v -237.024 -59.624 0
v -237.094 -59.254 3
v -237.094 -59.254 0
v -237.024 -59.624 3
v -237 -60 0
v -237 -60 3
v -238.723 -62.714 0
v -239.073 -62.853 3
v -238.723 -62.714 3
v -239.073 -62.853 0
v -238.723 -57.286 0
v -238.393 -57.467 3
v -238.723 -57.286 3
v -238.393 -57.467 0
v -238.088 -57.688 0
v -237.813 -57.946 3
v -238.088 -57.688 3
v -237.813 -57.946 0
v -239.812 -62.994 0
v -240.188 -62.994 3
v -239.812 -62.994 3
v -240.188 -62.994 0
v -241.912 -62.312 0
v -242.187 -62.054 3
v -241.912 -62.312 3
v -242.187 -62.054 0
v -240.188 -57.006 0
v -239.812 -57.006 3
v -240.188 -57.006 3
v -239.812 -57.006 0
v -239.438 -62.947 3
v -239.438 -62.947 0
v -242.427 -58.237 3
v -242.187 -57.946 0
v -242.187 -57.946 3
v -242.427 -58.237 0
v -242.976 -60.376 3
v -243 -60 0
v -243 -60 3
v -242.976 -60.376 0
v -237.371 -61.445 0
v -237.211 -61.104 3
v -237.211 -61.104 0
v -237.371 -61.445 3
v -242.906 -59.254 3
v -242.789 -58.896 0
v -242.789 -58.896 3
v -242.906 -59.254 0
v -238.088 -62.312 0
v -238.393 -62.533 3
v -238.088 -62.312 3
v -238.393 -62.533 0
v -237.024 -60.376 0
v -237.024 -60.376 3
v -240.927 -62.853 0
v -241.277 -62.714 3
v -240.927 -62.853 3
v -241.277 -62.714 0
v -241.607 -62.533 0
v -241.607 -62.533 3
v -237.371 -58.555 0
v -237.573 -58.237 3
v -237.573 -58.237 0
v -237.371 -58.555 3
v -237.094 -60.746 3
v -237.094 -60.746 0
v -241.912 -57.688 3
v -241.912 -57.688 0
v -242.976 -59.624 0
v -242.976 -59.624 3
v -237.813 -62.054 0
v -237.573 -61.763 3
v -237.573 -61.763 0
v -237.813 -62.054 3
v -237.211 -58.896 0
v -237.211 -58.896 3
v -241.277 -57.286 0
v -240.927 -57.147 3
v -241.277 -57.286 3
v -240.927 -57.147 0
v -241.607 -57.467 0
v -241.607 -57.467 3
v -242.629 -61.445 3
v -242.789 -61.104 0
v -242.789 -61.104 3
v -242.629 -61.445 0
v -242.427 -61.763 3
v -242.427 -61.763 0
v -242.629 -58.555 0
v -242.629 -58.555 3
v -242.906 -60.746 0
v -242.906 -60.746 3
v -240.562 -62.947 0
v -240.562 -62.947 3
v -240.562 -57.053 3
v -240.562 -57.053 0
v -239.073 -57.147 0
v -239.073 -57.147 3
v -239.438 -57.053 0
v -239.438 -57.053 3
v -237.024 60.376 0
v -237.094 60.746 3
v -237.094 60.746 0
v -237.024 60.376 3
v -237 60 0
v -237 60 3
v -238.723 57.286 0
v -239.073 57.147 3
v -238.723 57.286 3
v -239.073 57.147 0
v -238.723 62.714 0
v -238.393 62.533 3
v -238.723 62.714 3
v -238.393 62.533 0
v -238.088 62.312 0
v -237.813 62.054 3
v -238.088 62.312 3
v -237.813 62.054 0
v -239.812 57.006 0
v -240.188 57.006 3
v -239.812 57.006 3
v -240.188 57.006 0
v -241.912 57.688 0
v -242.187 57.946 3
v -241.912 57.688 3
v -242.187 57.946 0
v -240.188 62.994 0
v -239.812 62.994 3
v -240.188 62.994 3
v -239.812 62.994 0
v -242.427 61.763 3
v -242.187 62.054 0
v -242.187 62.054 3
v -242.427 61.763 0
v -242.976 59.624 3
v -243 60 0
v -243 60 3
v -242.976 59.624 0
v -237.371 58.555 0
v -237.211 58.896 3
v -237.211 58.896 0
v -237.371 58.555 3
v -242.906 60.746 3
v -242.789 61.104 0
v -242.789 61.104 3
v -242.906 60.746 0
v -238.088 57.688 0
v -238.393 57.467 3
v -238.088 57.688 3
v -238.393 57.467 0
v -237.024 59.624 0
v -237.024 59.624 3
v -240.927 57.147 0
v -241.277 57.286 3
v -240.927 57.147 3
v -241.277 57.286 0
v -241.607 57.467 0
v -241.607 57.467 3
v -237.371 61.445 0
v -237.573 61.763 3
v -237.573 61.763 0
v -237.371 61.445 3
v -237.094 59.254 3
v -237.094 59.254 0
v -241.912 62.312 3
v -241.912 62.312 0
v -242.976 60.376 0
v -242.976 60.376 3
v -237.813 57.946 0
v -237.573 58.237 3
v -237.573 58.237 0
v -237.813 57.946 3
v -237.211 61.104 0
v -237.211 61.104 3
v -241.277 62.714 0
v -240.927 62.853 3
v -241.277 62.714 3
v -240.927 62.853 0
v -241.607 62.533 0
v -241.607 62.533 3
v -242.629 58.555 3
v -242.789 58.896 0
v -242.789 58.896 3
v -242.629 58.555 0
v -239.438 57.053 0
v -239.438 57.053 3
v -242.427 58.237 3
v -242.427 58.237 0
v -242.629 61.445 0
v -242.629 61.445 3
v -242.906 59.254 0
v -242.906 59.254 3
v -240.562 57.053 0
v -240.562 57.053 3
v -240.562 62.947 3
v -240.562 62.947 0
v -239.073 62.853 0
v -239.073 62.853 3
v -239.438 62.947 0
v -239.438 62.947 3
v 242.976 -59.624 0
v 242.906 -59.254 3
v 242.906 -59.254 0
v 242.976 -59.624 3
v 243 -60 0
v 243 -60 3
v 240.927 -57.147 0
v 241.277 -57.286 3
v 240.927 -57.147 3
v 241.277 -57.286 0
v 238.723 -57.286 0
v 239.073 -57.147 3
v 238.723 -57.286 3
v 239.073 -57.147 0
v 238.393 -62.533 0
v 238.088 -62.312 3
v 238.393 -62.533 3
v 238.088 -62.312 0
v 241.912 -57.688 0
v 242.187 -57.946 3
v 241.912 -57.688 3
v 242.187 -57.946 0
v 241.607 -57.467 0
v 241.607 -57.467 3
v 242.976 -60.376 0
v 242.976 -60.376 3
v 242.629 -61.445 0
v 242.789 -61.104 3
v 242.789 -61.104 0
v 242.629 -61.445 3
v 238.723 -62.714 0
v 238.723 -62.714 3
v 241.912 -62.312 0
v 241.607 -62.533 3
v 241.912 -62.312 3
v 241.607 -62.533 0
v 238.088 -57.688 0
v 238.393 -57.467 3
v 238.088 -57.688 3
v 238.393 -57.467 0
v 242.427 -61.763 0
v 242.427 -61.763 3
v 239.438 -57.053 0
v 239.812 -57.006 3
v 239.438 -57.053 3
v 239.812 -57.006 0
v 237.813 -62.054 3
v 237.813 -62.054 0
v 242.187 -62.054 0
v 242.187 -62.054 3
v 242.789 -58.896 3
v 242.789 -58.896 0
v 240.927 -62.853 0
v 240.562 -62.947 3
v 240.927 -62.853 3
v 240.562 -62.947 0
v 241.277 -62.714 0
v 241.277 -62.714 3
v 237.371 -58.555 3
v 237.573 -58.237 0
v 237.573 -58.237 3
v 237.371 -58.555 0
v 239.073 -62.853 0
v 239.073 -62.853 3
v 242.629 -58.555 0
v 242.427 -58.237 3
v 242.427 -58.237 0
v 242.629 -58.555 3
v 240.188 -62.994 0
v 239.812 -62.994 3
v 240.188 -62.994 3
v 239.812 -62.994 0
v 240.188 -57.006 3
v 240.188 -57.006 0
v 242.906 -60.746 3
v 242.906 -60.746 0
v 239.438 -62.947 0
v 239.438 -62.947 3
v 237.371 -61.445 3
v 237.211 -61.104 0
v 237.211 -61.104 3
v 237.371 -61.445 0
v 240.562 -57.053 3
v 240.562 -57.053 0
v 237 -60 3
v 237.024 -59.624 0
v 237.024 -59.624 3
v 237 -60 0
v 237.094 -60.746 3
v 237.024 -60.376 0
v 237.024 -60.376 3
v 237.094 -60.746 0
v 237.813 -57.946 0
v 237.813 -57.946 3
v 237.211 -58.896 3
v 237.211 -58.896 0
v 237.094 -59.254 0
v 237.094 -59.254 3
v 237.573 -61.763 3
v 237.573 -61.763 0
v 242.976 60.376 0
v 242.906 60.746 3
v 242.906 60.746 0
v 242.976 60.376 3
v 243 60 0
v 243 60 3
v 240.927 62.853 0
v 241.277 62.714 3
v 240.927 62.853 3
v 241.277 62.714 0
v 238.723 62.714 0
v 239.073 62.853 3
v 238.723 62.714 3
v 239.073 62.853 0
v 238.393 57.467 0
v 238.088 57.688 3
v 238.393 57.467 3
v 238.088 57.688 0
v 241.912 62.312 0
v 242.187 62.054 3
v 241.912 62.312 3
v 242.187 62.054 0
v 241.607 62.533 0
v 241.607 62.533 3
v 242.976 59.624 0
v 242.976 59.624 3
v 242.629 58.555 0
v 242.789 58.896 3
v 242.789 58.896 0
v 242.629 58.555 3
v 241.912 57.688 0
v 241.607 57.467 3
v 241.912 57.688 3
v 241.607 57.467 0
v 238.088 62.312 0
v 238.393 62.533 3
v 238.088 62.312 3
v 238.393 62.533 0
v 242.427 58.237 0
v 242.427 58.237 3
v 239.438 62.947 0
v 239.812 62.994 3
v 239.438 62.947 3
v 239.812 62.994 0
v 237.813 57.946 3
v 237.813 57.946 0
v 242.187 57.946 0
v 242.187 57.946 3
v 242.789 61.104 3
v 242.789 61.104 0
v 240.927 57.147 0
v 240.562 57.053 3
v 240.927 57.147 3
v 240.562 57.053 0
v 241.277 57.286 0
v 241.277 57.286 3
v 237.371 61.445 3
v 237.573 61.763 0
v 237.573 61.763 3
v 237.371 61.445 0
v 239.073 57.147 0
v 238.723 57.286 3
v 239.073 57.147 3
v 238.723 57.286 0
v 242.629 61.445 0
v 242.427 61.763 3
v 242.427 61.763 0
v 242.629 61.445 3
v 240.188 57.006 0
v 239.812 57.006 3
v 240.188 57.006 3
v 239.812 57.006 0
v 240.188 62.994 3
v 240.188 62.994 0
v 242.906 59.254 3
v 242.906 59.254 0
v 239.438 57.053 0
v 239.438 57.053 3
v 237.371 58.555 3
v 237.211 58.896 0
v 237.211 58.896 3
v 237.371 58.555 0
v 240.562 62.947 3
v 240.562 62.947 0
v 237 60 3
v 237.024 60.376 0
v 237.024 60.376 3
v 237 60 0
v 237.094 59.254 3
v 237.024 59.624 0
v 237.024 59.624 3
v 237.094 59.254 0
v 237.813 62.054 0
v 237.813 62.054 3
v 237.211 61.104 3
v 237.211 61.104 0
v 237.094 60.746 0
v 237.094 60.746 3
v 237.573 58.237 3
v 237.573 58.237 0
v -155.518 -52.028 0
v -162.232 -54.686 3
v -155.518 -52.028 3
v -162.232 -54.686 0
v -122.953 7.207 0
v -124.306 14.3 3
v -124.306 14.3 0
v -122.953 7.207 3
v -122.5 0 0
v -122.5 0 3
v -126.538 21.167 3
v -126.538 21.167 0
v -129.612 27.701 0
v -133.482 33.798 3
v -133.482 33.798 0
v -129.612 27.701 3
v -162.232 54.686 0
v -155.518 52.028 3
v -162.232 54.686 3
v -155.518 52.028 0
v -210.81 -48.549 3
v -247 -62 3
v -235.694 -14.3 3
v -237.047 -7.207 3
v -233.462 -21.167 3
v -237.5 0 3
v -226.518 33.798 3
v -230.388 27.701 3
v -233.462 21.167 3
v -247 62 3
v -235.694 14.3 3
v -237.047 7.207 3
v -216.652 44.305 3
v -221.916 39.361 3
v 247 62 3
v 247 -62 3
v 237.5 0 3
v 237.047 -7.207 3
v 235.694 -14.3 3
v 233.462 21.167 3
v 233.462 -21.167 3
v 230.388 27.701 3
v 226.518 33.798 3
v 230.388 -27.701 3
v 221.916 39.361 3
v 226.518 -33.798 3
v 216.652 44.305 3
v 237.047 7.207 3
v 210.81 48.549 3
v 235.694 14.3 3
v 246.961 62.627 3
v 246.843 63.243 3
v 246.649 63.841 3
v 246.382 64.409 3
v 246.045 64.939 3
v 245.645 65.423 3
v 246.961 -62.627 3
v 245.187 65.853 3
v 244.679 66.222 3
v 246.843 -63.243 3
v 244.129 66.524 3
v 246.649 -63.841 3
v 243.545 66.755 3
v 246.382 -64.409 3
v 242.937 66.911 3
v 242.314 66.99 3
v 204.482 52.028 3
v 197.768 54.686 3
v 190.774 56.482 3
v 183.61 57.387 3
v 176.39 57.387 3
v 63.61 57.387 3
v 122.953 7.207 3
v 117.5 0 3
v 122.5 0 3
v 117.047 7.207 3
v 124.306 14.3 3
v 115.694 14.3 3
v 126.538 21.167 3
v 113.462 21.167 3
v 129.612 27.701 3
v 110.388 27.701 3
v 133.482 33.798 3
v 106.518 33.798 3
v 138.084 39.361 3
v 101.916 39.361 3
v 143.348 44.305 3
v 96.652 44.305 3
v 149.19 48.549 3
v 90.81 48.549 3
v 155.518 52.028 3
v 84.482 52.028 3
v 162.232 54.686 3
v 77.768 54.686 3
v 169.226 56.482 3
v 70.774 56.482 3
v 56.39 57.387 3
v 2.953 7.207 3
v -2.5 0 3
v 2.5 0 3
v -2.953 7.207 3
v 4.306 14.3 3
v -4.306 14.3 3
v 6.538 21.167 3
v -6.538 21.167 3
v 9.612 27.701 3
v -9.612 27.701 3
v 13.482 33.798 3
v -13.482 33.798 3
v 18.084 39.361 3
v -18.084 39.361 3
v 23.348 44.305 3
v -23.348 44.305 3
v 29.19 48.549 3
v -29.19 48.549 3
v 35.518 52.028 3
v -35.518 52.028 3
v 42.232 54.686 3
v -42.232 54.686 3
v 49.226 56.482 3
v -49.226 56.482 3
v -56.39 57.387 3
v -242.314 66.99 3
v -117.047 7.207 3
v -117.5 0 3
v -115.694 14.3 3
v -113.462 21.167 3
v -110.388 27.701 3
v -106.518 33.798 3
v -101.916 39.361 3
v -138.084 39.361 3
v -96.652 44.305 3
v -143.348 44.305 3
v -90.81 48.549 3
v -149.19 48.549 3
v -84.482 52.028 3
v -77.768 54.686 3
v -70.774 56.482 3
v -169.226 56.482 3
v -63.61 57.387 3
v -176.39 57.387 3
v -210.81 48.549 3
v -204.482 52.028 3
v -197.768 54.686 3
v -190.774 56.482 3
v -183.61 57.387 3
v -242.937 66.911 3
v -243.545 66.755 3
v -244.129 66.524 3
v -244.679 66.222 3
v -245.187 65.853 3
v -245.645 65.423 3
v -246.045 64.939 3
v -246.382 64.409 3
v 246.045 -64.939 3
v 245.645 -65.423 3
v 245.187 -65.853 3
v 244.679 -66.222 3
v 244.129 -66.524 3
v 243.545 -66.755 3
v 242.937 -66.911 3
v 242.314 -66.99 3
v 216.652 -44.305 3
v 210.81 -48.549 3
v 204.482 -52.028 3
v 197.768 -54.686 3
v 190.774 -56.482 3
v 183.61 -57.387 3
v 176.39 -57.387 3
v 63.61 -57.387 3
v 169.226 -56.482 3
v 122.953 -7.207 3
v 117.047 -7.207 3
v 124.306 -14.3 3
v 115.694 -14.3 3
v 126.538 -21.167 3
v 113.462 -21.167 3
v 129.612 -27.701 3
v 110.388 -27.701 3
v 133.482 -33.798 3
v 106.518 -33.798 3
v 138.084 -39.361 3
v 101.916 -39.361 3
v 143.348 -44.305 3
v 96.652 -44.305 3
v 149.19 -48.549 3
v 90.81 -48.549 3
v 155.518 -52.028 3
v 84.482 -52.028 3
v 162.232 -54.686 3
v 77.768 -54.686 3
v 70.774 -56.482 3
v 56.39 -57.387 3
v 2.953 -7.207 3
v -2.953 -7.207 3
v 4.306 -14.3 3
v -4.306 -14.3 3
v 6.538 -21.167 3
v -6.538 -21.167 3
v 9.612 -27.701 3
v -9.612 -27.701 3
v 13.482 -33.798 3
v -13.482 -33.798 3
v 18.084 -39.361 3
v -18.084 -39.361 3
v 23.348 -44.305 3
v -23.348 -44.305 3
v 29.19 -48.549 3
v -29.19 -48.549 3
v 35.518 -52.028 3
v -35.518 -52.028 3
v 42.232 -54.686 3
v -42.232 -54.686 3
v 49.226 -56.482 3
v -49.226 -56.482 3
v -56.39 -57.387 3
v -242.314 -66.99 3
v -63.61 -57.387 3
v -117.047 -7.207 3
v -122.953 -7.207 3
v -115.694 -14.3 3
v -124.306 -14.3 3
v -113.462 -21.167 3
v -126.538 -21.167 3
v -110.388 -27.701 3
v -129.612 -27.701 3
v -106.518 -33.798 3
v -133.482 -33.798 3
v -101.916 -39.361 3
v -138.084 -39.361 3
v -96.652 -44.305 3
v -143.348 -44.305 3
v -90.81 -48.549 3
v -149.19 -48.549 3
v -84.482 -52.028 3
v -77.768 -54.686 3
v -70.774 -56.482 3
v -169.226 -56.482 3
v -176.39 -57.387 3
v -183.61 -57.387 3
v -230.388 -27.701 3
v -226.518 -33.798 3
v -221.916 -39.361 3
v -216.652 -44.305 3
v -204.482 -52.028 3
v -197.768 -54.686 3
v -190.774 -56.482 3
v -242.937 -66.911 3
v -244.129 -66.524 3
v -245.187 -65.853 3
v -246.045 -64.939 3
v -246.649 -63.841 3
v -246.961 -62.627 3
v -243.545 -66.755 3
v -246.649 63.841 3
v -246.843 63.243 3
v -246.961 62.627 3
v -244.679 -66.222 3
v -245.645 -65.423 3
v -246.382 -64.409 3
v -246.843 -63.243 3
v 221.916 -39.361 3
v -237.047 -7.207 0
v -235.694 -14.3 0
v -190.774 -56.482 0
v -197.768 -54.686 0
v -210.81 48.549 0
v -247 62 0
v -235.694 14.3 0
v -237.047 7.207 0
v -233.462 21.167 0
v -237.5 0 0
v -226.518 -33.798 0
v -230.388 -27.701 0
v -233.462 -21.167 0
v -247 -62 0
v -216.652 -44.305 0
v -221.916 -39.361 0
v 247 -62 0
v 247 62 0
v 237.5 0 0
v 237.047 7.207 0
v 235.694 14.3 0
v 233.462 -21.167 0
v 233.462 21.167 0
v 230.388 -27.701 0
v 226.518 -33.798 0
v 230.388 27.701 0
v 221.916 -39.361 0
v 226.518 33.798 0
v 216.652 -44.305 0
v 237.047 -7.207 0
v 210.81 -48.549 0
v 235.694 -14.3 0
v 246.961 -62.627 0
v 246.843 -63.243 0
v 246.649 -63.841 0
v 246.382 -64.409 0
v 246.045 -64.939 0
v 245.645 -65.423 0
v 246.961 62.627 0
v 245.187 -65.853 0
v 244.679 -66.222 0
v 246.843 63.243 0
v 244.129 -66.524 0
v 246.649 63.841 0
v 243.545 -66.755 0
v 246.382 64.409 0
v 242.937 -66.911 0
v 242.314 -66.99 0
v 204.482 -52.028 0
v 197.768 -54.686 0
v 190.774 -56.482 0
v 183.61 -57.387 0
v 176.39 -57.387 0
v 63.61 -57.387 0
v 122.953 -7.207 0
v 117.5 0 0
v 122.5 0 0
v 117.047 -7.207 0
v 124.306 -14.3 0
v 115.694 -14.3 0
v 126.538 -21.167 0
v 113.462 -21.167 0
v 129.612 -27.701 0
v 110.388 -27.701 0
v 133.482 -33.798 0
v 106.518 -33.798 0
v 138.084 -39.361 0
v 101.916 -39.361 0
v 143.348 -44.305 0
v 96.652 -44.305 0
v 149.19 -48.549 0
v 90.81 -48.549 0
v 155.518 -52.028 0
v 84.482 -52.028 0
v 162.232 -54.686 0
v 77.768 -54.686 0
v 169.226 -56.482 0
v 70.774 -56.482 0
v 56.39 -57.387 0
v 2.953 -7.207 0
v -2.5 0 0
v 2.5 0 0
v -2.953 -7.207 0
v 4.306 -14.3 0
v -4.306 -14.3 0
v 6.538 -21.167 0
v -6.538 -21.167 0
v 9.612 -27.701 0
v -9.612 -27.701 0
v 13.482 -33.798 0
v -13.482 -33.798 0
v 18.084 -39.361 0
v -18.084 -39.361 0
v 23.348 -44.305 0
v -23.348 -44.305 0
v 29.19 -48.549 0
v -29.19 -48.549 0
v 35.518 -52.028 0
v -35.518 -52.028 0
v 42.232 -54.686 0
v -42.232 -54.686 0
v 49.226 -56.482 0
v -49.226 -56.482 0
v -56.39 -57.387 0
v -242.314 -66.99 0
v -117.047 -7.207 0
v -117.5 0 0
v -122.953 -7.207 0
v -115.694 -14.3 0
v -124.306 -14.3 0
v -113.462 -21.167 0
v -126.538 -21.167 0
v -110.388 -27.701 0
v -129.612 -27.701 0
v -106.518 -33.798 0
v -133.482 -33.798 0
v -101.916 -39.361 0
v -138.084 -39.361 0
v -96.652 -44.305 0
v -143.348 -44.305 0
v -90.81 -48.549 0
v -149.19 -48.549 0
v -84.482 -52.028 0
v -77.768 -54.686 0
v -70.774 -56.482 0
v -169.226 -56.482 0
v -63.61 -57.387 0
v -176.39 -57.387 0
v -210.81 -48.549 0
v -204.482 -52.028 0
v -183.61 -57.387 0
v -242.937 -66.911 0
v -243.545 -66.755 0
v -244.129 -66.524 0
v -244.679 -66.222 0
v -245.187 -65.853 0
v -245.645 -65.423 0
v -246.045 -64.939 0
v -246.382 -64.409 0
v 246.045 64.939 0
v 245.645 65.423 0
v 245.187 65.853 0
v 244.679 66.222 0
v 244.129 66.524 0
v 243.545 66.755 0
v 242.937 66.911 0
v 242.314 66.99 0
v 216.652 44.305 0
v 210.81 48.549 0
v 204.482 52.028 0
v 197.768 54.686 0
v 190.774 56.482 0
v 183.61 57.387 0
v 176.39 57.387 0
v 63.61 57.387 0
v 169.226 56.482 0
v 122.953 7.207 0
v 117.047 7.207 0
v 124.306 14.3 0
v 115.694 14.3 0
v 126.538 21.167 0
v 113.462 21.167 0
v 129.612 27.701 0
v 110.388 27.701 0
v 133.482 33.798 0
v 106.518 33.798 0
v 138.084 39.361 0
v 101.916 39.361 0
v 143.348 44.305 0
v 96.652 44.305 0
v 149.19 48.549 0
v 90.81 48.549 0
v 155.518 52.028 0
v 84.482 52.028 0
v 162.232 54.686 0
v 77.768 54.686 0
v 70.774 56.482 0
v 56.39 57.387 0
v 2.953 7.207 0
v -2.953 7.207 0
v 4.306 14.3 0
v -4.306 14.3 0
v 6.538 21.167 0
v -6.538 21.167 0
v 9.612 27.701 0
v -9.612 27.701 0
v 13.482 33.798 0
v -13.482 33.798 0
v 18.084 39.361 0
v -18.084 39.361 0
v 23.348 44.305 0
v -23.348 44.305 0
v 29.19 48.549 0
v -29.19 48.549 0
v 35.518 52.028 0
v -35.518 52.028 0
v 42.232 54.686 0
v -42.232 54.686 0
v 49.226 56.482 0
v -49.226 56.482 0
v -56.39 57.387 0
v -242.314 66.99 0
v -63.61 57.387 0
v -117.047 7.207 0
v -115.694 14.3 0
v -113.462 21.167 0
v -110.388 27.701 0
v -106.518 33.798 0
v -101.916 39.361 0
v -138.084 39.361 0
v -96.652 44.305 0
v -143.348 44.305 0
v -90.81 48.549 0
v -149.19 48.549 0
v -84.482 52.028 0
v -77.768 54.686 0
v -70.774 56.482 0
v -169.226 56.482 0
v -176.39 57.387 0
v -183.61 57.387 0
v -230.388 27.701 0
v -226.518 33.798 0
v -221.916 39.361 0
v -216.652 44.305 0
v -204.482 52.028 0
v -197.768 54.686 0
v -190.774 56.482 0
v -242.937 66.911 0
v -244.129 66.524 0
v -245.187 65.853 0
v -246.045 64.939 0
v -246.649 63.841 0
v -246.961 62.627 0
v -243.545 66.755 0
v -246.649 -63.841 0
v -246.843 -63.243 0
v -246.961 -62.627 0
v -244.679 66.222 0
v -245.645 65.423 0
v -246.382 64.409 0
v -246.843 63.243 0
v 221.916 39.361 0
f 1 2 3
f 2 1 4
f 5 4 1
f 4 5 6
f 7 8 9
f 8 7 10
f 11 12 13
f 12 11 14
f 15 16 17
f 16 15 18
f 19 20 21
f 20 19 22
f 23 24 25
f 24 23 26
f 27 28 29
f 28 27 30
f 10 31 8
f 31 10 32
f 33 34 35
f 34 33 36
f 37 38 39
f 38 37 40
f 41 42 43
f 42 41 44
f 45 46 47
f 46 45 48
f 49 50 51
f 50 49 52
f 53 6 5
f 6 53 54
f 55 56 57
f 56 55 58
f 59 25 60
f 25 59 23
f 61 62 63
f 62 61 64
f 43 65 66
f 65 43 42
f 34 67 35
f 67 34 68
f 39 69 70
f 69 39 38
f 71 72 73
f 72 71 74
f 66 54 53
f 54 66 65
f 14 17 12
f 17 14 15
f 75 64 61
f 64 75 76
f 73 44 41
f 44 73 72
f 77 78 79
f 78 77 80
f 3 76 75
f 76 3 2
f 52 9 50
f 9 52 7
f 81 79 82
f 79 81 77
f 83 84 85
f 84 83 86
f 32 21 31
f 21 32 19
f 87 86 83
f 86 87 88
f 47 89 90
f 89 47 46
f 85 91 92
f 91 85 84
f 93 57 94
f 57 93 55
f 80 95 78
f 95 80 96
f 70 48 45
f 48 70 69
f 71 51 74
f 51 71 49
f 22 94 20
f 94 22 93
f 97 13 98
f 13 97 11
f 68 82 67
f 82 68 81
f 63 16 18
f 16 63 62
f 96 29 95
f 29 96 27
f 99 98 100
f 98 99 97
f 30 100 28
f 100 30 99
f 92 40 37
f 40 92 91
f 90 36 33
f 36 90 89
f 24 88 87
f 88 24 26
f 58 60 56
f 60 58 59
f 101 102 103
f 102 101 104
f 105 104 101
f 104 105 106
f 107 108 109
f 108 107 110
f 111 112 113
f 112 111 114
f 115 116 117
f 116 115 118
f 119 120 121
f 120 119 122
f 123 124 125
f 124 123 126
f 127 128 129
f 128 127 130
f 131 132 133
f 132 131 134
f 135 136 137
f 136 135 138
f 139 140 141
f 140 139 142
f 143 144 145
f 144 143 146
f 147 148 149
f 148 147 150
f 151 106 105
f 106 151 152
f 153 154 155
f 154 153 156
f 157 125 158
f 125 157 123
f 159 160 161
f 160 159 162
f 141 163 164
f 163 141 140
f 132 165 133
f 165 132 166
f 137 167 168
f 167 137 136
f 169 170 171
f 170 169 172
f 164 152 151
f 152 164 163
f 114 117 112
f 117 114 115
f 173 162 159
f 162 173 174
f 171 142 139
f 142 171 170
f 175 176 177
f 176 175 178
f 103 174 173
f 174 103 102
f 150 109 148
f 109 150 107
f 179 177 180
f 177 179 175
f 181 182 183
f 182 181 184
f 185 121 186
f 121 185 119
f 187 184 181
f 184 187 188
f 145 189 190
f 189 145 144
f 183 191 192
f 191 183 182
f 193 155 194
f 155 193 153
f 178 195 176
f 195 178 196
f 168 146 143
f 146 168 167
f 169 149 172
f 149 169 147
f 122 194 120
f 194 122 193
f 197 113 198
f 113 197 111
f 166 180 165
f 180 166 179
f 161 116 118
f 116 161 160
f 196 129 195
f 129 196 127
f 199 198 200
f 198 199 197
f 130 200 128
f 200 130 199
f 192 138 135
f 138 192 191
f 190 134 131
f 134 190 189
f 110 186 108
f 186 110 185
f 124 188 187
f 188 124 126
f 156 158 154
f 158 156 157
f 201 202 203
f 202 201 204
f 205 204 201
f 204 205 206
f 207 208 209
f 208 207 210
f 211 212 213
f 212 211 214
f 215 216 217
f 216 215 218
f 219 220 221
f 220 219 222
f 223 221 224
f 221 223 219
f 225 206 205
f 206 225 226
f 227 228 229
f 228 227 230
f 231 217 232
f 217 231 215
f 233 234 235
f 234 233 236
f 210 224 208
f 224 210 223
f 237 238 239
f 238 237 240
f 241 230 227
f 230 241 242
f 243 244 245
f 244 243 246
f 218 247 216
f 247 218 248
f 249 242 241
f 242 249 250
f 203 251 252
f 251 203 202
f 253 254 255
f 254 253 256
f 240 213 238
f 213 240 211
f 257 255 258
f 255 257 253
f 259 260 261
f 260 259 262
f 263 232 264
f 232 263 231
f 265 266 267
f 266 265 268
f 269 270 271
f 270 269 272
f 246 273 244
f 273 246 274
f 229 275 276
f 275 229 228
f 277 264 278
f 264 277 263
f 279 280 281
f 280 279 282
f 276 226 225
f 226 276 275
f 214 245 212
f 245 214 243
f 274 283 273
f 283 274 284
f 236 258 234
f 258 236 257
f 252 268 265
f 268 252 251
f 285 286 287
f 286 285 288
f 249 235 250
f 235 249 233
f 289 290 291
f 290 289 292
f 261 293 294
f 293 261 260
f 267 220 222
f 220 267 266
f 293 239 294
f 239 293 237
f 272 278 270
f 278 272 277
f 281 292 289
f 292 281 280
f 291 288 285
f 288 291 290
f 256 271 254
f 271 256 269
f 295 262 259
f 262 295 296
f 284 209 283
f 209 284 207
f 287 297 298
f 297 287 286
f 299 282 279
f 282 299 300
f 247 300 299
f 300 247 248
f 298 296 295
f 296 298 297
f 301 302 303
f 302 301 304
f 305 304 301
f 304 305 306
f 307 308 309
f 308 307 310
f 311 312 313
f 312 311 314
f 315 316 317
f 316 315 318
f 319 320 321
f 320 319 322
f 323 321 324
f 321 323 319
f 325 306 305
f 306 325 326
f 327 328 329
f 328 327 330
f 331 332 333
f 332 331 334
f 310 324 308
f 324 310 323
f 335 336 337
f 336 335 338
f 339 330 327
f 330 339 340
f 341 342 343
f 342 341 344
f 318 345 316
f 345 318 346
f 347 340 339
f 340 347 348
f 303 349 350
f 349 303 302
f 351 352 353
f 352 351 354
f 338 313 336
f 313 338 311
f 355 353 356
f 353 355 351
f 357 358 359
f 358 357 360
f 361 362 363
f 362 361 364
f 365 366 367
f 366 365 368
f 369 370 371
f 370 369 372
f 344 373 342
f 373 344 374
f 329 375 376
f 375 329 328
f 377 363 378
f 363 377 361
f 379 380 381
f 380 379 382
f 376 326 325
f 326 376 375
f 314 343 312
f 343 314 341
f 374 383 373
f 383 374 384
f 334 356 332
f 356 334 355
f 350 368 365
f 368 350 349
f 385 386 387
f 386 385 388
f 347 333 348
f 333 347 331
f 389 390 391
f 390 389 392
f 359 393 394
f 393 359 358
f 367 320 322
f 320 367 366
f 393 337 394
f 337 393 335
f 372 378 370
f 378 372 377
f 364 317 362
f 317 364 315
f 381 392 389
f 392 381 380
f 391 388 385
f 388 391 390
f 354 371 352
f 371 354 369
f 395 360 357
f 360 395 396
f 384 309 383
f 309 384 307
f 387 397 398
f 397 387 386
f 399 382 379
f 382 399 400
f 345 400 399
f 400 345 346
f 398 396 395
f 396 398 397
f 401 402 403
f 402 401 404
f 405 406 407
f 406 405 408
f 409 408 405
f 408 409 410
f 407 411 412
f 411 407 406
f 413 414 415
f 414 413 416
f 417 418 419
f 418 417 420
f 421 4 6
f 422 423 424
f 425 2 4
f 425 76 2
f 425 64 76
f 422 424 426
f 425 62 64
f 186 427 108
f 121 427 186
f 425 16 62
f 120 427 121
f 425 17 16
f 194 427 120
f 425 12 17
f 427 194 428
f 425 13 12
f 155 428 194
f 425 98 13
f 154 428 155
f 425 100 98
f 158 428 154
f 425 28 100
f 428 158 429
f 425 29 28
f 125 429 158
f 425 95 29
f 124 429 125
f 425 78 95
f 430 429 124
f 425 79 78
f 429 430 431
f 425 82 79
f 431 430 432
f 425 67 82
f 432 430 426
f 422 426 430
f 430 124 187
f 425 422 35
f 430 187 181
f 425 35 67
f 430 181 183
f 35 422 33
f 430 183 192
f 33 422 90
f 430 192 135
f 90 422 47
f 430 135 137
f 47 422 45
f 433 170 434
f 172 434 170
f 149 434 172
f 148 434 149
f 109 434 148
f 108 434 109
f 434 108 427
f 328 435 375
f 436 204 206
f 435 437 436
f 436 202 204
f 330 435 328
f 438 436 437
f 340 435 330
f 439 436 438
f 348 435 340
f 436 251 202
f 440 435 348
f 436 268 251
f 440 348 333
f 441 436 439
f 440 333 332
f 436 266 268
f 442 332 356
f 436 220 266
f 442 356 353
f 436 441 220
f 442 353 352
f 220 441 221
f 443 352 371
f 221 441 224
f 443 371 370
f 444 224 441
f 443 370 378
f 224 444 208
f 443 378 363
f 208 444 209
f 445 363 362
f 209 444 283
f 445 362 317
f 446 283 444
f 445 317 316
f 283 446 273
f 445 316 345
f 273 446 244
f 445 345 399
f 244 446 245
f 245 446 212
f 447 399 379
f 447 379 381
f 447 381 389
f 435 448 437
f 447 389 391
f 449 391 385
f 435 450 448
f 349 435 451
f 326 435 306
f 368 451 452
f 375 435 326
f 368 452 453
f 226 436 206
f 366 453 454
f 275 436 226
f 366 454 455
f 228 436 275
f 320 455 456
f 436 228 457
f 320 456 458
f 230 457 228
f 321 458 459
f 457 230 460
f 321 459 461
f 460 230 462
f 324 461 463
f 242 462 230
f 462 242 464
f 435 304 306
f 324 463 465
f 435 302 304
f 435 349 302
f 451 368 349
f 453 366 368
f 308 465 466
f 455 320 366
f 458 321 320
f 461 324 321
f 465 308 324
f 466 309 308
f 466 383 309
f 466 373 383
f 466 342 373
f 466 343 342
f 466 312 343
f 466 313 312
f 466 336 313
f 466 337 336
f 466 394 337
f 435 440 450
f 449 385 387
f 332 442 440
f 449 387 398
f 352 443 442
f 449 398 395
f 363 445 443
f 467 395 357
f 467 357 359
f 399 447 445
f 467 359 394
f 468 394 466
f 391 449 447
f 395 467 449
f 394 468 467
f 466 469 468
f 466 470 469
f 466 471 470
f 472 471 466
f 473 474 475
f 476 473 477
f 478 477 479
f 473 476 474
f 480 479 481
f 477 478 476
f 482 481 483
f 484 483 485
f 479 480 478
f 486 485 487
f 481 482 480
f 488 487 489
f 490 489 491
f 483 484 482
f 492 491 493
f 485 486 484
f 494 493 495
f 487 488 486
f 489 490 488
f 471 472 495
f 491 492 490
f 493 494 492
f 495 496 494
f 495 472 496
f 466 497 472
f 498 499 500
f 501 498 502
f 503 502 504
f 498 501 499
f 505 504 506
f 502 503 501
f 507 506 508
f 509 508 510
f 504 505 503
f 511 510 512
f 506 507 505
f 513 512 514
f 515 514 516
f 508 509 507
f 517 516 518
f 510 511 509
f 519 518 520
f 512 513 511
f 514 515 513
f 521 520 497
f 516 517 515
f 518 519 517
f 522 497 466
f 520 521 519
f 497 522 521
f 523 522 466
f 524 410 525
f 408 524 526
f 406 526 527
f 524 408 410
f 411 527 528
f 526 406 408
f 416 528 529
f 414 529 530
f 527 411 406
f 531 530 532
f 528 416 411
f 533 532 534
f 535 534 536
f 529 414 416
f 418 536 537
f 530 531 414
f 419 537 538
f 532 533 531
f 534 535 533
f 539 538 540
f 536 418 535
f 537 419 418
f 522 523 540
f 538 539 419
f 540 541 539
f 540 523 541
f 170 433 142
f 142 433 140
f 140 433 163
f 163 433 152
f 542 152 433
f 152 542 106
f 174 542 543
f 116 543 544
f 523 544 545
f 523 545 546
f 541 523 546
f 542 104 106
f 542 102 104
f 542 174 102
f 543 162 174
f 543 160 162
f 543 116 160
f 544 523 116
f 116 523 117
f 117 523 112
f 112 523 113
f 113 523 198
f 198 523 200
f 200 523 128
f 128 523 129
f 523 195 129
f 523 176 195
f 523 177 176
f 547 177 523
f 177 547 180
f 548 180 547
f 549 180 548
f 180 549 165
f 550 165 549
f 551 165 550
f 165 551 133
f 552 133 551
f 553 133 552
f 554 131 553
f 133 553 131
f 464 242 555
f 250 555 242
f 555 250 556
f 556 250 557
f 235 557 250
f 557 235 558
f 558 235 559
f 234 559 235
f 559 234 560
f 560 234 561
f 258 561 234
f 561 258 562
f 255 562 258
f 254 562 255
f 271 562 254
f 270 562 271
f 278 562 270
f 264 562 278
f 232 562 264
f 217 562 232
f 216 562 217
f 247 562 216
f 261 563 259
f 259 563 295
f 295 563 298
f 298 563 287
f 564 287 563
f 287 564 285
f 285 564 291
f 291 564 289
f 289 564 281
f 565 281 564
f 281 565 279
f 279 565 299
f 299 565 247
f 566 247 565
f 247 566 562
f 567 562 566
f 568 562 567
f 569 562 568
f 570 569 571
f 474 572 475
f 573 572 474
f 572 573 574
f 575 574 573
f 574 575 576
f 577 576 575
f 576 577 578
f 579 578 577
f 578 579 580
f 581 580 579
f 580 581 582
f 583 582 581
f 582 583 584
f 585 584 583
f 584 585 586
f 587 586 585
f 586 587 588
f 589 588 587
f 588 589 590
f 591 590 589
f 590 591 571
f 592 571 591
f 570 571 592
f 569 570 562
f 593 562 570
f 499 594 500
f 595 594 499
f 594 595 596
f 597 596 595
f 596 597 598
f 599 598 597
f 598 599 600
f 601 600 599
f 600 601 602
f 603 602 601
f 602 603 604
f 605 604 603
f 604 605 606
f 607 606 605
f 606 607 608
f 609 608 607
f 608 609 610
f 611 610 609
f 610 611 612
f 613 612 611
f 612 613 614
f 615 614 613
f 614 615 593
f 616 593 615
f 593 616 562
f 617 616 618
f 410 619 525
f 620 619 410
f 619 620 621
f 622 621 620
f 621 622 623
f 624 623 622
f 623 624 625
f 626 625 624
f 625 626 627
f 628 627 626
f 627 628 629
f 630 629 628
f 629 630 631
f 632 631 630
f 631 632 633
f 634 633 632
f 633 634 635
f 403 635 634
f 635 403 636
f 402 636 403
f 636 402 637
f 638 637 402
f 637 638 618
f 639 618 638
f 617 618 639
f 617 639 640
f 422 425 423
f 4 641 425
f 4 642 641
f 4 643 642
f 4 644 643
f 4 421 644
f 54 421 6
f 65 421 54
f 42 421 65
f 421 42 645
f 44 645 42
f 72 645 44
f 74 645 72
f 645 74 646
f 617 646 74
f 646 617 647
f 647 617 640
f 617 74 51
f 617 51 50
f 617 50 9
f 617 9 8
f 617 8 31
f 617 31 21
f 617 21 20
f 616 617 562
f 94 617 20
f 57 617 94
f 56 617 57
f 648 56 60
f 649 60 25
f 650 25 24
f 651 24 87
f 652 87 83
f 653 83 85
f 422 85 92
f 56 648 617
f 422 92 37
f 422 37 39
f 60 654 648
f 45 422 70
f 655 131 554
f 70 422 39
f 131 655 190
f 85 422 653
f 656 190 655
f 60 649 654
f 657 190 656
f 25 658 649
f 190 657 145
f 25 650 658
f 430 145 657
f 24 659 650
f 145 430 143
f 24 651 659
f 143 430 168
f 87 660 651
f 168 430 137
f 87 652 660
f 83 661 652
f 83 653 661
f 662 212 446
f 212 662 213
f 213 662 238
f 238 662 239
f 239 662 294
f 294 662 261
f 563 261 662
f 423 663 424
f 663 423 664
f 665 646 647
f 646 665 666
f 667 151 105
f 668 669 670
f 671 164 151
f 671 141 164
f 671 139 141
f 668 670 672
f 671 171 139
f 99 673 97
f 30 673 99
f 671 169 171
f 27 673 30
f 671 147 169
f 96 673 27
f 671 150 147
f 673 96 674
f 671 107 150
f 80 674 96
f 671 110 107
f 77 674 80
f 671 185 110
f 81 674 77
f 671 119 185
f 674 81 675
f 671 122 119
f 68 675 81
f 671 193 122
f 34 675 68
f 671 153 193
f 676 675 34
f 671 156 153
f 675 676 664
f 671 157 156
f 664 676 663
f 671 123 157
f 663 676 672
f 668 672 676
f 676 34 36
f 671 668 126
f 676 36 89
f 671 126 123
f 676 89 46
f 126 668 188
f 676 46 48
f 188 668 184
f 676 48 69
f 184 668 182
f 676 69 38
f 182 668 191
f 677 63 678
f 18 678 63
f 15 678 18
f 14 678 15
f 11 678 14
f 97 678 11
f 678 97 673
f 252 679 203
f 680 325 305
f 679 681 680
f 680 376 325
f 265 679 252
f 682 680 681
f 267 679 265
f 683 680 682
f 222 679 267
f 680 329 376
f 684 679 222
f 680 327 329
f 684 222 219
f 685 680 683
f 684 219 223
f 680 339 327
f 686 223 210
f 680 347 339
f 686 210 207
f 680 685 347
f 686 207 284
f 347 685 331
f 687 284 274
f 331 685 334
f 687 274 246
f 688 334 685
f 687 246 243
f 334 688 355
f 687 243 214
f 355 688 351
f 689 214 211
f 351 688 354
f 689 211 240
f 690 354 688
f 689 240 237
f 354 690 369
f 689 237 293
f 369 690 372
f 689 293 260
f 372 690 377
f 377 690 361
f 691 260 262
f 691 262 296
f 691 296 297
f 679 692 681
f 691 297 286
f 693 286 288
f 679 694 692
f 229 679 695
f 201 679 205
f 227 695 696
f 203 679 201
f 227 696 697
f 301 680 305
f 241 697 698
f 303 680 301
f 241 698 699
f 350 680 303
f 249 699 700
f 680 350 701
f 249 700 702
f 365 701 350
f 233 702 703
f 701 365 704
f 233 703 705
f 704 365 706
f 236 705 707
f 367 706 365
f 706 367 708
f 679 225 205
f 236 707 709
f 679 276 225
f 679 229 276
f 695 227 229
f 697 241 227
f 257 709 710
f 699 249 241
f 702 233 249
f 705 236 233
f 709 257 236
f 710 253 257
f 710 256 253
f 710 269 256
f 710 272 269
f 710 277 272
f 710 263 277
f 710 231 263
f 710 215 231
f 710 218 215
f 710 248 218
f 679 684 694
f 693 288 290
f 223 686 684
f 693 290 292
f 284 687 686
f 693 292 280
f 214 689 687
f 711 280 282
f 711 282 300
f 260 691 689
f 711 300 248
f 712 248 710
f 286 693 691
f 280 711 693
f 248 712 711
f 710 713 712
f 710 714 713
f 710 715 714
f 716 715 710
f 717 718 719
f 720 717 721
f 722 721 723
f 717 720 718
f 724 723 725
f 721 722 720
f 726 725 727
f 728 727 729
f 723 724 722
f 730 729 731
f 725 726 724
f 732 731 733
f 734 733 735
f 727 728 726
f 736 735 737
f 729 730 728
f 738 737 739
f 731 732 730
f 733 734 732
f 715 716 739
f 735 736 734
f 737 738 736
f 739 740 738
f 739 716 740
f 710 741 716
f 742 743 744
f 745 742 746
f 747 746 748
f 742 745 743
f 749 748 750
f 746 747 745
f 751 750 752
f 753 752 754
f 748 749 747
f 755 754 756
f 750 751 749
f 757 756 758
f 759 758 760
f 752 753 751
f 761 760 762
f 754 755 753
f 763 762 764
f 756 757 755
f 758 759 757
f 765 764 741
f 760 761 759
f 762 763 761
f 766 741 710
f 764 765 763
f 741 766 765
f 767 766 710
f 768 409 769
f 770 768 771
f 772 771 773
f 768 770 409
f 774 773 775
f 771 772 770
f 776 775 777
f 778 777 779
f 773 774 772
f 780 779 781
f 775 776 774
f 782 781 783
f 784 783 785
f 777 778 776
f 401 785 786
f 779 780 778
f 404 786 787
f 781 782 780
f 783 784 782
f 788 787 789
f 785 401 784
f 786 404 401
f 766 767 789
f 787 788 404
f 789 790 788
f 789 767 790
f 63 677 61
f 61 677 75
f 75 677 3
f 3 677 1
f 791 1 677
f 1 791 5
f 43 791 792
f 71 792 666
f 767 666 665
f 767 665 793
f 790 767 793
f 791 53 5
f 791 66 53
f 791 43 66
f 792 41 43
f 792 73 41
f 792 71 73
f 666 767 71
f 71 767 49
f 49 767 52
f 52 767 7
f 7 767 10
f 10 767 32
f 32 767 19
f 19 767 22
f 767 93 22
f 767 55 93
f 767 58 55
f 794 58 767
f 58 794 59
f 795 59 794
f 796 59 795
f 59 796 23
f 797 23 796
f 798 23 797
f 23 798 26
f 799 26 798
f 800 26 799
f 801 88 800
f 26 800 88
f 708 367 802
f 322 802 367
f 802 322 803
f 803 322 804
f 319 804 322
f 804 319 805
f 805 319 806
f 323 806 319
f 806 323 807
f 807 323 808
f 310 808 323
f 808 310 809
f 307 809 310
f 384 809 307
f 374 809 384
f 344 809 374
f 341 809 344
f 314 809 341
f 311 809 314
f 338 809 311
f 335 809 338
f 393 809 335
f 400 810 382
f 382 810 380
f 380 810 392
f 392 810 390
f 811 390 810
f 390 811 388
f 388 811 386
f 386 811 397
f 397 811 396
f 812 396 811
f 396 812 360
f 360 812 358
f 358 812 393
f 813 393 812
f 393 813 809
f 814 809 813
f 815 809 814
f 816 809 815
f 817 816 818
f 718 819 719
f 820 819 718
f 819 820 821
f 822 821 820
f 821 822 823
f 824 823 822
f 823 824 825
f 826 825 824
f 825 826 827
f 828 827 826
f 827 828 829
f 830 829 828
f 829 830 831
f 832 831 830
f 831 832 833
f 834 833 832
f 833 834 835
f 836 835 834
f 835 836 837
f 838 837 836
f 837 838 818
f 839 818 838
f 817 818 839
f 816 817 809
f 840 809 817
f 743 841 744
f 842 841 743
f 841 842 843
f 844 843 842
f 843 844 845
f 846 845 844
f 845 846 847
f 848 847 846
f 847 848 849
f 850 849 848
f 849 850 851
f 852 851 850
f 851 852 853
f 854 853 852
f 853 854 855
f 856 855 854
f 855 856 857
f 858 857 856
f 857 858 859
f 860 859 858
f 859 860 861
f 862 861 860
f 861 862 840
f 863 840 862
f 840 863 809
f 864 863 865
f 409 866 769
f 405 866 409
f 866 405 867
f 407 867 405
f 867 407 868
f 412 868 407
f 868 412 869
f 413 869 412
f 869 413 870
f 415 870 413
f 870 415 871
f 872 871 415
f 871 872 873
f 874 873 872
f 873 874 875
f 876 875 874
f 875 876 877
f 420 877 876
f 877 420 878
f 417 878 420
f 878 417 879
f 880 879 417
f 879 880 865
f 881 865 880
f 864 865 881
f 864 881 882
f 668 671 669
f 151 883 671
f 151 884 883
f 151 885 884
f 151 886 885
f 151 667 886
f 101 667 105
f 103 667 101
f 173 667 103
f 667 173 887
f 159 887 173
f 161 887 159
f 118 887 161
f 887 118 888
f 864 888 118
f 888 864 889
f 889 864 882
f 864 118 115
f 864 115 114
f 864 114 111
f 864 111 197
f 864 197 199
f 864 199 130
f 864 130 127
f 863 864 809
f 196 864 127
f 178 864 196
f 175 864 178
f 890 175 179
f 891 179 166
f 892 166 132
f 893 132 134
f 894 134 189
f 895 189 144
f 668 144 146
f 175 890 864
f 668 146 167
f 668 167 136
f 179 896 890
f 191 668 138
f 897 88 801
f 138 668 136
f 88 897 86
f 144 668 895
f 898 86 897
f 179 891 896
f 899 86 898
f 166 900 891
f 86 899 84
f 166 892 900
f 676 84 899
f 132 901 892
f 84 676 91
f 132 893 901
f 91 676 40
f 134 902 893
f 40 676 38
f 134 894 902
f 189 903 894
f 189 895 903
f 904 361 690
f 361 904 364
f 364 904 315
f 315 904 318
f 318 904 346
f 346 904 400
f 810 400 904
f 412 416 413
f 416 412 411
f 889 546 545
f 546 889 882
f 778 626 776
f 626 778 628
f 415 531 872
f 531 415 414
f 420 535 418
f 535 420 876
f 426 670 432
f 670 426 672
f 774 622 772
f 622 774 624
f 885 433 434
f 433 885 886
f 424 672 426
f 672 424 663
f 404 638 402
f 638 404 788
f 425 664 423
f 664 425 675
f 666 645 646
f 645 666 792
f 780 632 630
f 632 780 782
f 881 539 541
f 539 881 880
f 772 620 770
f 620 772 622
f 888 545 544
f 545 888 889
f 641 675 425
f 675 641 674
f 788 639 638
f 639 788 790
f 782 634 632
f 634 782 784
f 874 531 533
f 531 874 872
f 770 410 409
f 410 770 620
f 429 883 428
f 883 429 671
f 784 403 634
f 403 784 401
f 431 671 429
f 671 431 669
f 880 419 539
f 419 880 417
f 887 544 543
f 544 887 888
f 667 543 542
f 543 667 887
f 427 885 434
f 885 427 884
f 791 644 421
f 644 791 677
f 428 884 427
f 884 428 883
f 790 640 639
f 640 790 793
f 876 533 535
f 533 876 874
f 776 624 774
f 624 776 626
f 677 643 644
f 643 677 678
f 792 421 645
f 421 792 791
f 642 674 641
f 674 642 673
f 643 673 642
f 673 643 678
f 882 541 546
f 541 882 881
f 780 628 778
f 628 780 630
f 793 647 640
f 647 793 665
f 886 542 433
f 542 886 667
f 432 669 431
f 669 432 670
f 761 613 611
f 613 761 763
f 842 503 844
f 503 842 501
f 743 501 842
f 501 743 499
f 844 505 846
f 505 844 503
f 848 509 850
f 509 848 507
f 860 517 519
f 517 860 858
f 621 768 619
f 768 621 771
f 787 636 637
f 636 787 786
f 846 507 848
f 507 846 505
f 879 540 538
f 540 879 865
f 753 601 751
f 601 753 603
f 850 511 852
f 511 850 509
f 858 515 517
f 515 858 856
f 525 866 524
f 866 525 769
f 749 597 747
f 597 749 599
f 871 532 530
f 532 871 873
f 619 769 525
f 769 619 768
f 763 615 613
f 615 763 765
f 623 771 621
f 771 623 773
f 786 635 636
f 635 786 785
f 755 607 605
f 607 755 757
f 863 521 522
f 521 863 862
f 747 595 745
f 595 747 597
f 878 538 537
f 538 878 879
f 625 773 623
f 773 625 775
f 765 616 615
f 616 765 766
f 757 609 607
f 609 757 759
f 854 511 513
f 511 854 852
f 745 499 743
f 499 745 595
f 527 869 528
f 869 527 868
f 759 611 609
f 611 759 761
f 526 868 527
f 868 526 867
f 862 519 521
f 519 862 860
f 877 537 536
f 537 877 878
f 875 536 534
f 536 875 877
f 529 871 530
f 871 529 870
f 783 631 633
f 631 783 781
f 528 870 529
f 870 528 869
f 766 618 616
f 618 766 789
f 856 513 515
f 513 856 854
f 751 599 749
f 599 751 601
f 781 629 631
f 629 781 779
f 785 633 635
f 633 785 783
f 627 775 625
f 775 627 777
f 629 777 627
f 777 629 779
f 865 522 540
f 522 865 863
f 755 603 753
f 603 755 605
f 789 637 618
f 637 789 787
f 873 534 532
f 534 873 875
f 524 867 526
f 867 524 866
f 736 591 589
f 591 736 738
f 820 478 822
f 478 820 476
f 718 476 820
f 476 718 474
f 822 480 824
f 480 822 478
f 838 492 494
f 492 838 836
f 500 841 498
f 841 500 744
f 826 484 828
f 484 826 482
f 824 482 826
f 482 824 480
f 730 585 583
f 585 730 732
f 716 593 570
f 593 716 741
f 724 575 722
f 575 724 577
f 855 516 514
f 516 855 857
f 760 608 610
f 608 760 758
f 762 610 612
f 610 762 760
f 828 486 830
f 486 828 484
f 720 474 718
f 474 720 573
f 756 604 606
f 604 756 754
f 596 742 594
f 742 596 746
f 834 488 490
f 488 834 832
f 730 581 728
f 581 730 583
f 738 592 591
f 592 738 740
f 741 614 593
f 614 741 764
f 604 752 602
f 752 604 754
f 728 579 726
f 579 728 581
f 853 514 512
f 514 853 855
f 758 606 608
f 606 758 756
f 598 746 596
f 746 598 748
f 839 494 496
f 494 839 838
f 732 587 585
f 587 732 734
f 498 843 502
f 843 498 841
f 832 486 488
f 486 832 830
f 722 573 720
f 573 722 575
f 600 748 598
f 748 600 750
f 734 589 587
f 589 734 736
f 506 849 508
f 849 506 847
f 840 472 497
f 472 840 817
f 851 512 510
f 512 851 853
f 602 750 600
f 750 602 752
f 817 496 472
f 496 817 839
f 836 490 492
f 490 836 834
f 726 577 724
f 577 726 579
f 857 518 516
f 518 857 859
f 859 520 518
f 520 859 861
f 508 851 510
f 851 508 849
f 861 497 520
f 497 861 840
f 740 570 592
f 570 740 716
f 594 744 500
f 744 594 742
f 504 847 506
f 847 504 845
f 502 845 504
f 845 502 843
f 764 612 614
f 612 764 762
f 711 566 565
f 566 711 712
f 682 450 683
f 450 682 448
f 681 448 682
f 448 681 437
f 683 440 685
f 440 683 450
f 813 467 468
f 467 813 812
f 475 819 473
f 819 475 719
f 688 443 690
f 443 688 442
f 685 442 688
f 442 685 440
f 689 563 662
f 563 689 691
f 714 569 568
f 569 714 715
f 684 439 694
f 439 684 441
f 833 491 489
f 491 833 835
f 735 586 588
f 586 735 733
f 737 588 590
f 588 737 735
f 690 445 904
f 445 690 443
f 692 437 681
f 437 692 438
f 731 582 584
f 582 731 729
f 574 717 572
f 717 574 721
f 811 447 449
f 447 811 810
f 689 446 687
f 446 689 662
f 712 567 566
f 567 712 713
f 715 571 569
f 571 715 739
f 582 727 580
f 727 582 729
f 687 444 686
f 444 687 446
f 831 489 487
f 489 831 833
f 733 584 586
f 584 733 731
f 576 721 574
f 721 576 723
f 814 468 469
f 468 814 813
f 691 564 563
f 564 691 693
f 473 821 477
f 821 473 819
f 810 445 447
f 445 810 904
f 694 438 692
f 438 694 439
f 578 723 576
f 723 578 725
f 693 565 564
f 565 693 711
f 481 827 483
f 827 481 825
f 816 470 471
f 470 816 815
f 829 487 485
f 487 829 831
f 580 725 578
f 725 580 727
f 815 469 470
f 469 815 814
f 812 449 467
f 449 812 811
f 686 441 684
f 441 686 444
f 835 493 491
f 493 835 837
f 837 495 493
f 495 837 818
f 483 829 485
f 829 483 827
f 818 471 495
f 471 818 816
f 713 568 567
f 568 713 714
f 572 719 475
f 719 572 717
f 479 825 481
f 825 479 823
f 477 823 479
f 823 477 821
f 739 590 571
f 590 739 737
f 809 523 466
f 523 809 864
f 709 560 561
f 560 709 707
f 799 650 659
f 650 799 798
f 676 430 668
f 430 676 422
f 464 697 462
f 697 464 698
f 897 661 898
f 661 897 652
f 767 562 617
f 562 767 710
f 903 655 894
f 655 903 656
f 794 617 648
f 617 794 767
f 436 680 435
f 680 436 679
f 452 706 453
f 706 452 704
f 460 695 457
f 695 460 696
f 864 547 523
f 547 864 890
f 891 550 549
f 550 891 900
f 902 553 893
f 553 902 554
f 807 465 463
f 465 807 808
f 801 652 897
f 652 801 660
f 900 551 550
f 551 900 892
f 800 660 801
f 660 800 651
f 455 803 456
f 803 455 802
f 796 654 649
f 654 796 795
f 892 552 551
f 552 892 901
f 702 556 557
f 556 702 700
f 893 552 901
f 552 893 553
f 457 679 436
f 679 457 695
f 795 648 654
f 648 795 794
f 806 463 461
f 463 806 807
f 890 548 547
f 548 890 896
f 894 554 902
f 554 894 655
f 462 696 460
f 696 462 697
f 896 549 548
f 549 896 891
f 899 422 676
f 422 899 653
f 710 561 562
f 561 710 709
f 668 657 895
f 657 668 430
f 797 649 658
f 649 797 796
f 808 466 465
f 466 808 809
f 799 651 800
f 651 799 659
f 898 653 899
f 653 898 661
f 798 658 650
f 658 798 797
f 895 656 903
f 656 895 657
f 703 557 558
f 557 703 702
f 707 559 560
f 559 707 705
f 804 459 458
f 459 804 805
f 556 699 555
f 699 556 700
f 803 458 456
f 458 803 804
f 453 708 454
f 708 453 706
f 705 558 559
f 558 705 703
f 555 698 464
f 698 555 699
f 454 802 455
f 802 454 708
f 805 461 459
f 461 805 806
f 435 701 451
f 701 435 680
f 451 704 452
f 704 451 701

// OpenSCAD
$fn = 50;


difference() {
	union() {
		hull() {
			translate(v = [-242.0000000000, 62.0000000000, 0]) {
				cylinder(h = 3, r = 5);
			}
			translate(v = [242.0000000000, 62.0000000000, 0]) {
				cylinder(h = 3, r = 5);
			}
			translate(v = [-242.0000000000, -62.0000000000, 0]) {
				cylinder(h = 3, r = 5);
			}
			translate(v = [242.0000000000, -62.0000000000, 0]) {
				cylinder(h = 3, r = 5);
			}
		}
	}
	union() {
		#translate(v = [-240.0000000000, -60.0000000000, -100.0000000000]) {
			cylinder(h = 200, r = 3.0000000000);
		}
		#translate(v = [-240.0000000000, 60.0000000000, -100.0000000000]) {
			cylinder(h = 200, r = 3.0000000000);
		}
		#translate(v = [240.0000000000, -60.0000000000, -100.0000000000]) {
			cylinder(h = 200, r = 3.0000000000);
		}
		#translate(v = [240.0000000000, 60.0000000000, -100.0000000000]) {
			cylinder(h = 200, r = 3.0000000000);
		}
		#translate(v = [-180.0000000000, 0, 0]) {
			cylinder(h = 3, r = 57.5000000000);
		}
		#translate(v = [-60.0000000000, 0, 0]) {
			cylinder(h = 3, r = 57.5000000000);
		}
		#translate(v = [60.0000000000, 0, 0]) {
			cylinder(h = 3, r = 57.5000000000);
		}
		#translate(v = [180.0000000000, 0, 0]) {
			cylinder(h = 3, r = 57.5000000000);
		}
	}
}
